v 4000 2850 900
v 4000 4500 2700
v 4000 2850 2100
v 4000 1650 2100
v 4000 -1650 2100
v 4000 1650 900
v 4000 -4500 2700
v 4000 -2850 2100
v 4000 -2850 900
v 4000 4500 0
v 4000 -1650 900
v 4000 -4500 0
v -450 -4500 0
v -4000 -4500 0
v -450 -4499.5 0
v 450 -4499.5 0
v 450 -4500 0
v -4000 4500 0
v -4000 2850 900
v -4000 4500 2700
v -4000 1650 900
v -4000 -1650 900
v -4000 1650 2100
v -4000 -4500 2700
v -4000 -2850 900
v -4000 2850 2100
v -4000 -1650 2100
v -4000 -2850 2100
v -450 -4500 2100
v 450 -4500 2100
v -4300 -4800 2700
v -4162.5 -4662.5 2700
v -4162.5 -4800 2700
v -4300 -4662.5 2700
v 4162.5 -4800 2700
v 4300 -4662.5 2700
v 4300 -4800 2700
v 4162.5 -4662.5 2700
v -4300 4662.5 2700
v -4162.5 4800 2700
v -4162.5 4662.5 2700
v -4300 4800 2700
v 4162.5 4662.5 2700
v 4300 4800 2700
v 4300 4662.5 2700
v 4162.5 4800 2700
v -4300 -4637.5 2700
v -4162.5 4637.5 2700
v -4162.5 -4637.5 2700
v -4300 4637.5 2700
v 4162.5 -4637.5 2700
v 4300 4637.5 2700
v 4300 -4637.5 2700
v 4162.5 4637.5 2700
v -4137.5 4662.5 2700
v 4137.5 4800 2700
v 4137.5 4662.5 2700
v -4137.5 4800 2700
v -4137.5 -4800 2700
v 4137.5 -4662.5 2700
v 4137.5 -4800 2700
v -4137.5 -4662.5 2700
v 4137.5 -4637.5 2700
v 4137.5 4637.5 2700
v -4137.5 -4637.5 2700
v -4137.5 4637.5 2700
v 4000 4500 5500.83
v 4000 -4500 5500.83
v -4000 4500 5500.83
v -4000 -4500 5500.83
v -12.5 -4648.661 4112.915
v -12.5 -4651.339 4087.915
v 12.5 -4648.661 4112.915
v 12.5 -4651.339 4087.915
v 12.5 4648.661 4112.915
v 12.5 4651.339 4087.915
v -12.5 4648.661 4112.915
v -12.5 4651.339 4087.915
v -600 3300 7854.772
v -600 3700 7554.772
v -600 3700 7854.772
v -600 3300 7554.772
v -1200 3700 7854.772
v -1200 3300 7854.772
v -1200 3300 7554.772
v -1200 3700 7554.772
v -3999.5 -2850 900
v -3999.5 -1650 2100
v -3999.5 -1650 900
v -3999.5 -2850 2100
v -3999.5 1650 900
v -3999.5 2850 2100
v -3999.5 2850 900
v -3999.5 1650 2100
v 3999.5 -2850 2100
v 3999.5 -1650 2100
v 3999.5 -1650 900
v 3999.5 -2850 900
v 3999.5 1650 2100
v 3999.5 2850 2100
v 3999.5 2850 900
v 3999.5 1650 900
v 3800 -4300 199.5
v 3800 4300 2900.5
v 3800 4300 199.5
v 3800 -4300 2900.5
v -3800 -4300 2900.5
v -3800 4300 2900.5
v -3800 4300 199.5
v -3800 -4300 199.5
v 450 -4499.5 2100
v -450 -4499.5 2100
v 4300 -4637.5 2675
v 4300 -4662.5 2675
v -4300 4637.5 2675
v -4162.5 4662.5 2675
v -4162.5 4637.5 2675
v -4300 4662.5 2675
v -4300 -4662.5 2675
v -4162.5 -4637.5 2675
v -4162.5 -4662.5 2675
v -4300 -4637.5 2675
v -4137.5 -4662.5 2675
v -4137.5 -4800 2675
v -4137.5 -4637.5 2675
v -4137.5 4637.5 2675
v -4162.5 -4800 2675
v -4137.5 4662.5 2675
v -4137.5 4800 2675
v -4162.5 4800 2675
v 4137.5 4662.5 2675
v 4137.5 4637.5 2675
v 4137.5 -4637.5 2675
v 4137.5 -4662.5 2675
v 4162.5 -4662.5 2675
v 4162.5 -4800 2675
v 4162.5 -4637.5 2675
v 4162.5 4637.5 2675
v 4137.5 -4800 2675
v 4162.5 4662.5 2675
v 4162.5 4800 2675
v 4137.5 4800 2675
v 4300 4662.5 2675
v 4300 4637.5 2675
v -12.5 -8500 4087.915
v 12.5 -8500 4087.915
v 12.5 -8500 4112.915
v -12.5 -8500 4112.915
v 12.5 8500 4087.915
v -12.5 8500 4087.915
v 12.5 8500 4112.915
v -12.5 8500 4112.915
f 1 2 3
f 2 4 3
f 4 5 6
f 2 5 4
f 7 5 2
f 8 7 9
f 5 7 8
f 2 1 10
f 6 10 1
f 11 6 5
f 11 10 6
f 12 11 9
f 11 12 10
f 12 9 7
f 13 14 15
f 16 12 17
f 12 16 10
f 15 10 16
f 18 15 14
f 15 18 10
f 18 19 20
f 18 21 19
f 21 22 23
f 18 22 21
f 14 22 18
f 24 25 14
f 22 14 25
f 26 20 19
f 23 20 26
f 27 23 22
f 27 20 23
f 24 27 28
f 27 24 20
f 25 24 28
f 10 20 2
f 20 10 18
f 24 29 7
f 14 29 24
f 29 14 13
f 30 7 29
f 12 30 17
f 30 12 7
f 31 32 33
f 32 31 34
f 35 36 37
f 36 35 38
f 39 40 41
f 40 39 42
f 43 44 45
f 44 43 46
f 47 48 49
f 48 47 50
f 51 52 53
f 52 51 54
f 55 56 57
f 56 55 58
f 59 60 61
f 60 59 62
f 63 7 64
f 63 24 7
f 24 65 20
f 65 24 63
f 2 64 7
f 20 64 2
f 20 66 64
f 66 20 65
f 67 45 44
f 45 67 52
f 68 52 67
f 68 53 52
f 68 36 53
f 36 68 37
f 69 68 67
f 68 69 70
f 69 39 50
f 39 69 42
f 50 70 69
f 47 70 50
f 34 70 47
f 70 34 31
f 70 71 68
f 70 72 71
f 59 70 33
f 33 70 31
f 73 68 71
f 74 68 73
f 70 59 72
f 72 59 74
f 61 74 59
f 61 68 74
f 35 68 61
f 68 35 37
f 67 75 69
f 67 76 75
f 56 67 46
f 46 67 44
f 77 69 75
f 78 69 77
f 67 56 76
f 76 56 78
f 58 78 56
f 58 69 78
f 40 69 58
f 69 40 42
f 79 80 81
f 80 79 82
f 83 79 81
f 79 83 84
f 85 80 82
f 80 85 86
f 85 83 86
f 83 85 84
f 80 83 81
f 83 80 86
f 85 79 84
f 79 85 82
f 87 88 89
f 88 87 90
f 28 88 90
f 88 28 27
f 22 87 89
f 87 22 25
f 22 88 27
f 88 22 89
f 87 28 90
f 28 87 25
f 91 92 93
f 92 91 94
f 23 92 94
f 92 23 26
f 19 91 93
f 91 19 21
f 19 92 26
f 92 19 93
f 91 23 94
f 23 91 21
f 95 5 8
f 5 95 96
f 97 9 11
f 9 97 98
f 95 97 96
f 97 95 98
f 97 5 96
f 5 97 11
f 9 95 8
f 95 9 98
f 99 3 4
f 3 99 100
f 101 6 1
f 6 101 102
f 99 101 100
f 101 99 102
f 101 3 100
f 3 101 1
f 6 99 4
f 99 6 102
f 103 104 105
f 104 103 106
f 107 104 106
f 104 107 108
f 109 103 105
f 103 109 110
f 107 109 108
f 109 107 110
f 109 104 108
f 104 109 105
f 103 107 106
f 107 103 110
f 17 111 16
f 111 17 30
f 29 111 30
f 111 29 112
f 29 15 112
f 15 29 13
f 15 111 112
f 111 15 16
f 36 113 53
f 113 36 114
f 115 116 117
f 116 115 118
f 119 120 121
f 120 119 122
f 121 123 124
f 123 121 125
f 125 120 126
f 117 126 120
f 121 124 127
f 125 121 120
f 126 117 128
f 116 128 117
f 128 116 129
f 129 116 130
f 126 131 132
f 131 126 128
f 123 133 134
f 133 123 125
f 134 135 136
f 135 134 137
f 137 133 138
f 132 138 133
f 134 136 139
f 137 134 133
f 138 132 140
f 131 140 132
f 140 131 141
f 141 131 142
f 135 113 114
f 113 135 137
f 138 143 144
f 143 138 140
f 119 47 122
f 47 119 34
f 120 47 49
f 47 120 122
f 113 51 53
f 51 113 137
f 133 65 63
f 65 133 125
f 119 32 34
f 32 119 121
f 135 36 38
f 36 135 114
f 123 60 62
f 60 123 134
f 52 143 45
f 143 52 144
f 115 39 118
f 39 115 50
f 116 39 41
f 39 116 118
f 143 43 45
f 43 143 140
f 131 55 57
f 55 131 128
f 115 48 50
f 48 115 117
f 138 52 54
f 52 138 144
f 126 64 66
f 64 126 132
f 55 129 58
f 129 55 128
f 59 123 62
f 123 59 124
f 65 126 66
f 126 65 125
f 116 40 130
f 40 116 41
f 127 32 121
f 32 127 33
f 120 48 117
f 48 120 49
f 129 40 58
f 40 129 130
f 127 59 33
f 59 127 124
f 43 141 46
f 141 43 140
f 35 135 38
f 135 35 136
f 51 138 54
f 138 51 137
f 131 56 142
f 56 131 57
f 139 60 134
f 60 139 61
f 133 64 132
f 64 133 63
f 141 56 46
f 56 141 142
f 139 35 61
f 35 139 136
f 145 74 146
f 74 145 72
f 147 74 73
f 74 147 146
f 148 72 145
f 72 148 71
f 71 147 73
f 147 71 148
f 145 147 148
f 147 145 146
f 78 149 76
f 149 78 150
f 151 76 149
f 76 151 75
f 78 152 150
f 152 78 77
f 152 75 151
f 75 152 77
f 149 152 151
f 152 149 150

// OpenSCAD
// Cozy Cottage House - Single Body, Printable Design
// Units: millimeters
// Origin (0,0,0): ground plane center of house footprint
// Axes: +X = width (left↔right), +Y = length (front (−Y) ↔ back (+Y)), +Z = up

// =============================================================================
// EDITABLE PARAMETERS
// =============================================================================

// Overall dimensions
L = 9000;                    // Overall exterior length (Y)
W = 8000;                    // Overall exterior width (X)
H_wall = 2700;               // Top of wall/eaves height
Wall_thk = 200;              // Wall thickness
Plinth_h = 200;              // Base curb below walls

// Roof parameters
Roof_pitch_deg = 35;         // Slope from eaves to ridge (degrees)
Roof_overhang = 300;         // Eave & gable overhang

// Door parameters
Door_w = 900;                // Door width
Door_h = 2100;               // Door height
Door_sill_h = 0;             // Door sill height (0 for flush)

// Window parameters
Win_w = 1200;                // Window width
Win_h = 1200;                // Window height
Win_sill_h = 900;            // Bottom of window above ground

// Chimney parameters
Chimney_w = 600;             // Chimney width (X)
Chimney_d = 400;             // Chimney depth (Y)
Chimney_offset_from_gable = 1200;  // Distance from rear gable toward ridge
Chimney_side_offset = -1200; // Offset along X (negative = left side)

// Edge treatment parameters
Fascia_thk = 25;             // Fascia thickness
Corner_fillet = 2;           // Corner fillet radius

// =============================================================================
// CALCULATED PARAMETERS
// =============================================================================

// Roof calculations
Rise = 0.5 * W * tan(Roof_pitch_deg);  // Rise from eaves to ridge
H_ridge = H_wall + Rise;               // Ridge height

// Window positions (centers at Y = ±L/4)
Win_y_front = -L/4;          // Front window Y position
Win_y_back = L/4;            // Back window Y position

// Chimney position
Chimney_y = L/2 - Chimney_offset_from_gable;  // Chimney Y position

// =============================================================================
// MAIN HOUSE ASSEMBLY
// =============================================================================

module house() {
    // Create the main house structure
    difference() {
        // Main solid body
        union() {
            // 1. Plinth (base)
            plinth();
            
            // 2. Exterior walls
            walls();
            
            // 3. Roof
            roof();
            
            // 4. Chimney
            chimney();
        }
        
        // 5. Interior cavity (hollow out walls)
        interior_cavity();
        
        // 6. Door opening
        door_opening();
        
        // 7. Window openings
        window_openings();
    }
    
    // 8. Edge treatments
    edge_treatments();
}

// =============================================================================
// COMPONENT MODULES
// =============================================================================

module plinth() {
    // Base plinth rectangle centered at origin
    translate([0, 0, Plinth_h/2])
        cube([W, L, Plinth_h], center=true);
}

module walls() {
    // Exterior wall shell
    translate([0, 0, Plinth_h + H_wall/2])
        cube([W, L, H_wall], center=true);
}

module interior_cavity() {
    // Hollow out the interior, keeping wall thickness
    translate([0, 0, Plinth_h + H_wall/2])
        cube([W - 2*Wall_thk, L - 2*Wall_thk, H_wall + 1], center=true);
}

module roof() {
    // Gable roof with overhang
    // Create the roof as a polyhedron
    roof_points = [
        // Bottom face (eaves)
        [-W/2 - Roof_overhang, -L/2 - Roof_overhang, H_wall],
        [W/2 + Roof_overhang, -L/2 - Roof_overhang, H_wall],
        [W/2 + Roof_overhang, L/2 + Roof_overhang, H_wall],
        [-W/2 - Roof_overhang, L/2 + Roof_overhang, H_wall],
        
        // Ridge points
        [-W/2, -L/2, H_ridge],
        [W/2, -L/2, H_ridge],
        [W/2, L/2, H_ridge],
        [-W/2, L/2, H_ridge]
    ];
    
    roof_faces = [
        // Bottom face
        [0, 1, 2, 3],
        // Front gable
        [0, 4, 5, 1],
        // Back gable
        [2, 6, 7, 3],
        // Left roof plane
        [0, 3, 7, 4],
        // Right roof plane
        [1, 5, 6, 2],
        // Ridge
        [4, 7, 6, 5]
    ];
    
    polyhedron(points=roof_points, faces=roof_faces);
}

module chimney() {
    // Chimney on rear roof half
    // Calculate chimney position on sloped roof
    chimney_x = Chimney_side_offset;
    chimney_y = Chimney_y;
    
    // Chimney height above ridge
    chimney_height = 300;
    
    // Position chimney base on roof surface
    translate([chimney_x, chimney_y, H_wall + (chimney_y + L/2) * Rise / (L/2)])
        cube([Chimney_w, Chimney_d, chimney_height]);
}

module door_opening() {
    // Front door opening
    translate([0, -L/2 - Wall_thk/2, Door_sill_h + Door_h/2])
        cube([Door_w, Wall_thk + 1, Door_h], center=true);
}

module window_openings() {
    // Four windows: two on each long side
    
    // Left side windows
    translate([-W/2 - Wall_thk/2, Win_y_front, Win_sill_h + Win_h/2])
        cube([Wall_thk + 1, Win_w, Win_h], center=true);
    translate([-W/2 - Wall_thk/2, Win_y_back, Win_sill_h + Win_h/2])
        cube([Wall_thk + 1, Win_w, Win_h], center=true);
    
    // Right side windows
    translate([W/2 + Wall_thk/2, Win_y_front, Win_sill_h + Win_h/2])
        cube([Wall_thk + 1, Win_w, Win_h], center=true);
    translate([W/2 + Wall_thk/2, Win_y_back, Win_sill_h + Win_h/2])
        cube([Wall_thk + 1, Win_w, Win_h], center=true);
}

module edge_treatments() {
    // Eave fascia
    eave_fascia();
    
    // Gable fascia
    gable_fascia();
    
    // Corner fillets (if supported)
    corner_fillets();
}

module eave_fascia() {
    // Vertical fascia under roof perimeter
    // Front eave
    translate([0, -L/2 - Roof_overhang/2, H_wall - Fascia_thk/2])
        cube([W + 2*Roof_overhang, Fascia_thk, Fascia_thk], center=true);
    
    // Back eave
    translate([0, L/2 + Roof_overhang/2, H_wall - Fascia_thk/2])
        cube([W + 2*Roof_overhang, Fascia_thk, Fascia_thk], center=true);
    
    // Left eave
    translate([-W/2 - Roof_overhang/2, 0, H_wall - Fascia_thk/2])
        cube([Fascia_thk, L + 2*Roof_overhang, Fascia_thk], center=true);
    
    // Right eave
    translate([W/2 + Roof_overhang/2, 0, H_wall - Fascia_thk/2])
        cube([Fascia_thk, L + 2*Roof_overhang, Fascia_thk], center=true);
}

module gable_fascia() {
    // Fascia along gable edges
    // Front gable
    translate([0, -L/2, H_wall + Rise/2])
        rotate([0, 90, 0])
            cube([Fascia_thk, W, Fascia_thk], center=true);
    
    // Back gable
    translate([0, L/2, H_wall + Rise/2])
        rotate([0, 90, 0])
            cube([Fascia_thk, W, Fascia_thk], center=true);
}

module corner_fillets() {
    // Corner fillets on exposed edges
    // This is a simplified version - full fillet implementation would be more complex
    // For now, we'll add small chamfers at key corners
    
    // Wall corners
    for(x = [-1, 1]) {
        for(y = [-1, 1]) {
            translate([x * (W/2 - Corner_fillet), y * (L/2 - Corner_fillet), Plinth_h + H_wall/2])
                cube([2*Corner_fillet, 2*Corner_fillet, H_wall], center=true);
        }
    }
}

// =============================================================================
// RENDERING
// =============================================================================

// Render the complete house
house();

// Optional: Add coordinate system visualization (comment out for final print)
// %coordinate_system();

module coordinate_system() {
    // Visualize coordinate system
    color("red") translate([0, 0, 0]) cube([100, 10, 10]); // X axis
    color("green") translate([0, 0, 0]) cube([10, 100, 10]); // Y axis  
    color("blue") translate([0, 0, 0]) cube([10, 10, 100]); // Z axis
}
